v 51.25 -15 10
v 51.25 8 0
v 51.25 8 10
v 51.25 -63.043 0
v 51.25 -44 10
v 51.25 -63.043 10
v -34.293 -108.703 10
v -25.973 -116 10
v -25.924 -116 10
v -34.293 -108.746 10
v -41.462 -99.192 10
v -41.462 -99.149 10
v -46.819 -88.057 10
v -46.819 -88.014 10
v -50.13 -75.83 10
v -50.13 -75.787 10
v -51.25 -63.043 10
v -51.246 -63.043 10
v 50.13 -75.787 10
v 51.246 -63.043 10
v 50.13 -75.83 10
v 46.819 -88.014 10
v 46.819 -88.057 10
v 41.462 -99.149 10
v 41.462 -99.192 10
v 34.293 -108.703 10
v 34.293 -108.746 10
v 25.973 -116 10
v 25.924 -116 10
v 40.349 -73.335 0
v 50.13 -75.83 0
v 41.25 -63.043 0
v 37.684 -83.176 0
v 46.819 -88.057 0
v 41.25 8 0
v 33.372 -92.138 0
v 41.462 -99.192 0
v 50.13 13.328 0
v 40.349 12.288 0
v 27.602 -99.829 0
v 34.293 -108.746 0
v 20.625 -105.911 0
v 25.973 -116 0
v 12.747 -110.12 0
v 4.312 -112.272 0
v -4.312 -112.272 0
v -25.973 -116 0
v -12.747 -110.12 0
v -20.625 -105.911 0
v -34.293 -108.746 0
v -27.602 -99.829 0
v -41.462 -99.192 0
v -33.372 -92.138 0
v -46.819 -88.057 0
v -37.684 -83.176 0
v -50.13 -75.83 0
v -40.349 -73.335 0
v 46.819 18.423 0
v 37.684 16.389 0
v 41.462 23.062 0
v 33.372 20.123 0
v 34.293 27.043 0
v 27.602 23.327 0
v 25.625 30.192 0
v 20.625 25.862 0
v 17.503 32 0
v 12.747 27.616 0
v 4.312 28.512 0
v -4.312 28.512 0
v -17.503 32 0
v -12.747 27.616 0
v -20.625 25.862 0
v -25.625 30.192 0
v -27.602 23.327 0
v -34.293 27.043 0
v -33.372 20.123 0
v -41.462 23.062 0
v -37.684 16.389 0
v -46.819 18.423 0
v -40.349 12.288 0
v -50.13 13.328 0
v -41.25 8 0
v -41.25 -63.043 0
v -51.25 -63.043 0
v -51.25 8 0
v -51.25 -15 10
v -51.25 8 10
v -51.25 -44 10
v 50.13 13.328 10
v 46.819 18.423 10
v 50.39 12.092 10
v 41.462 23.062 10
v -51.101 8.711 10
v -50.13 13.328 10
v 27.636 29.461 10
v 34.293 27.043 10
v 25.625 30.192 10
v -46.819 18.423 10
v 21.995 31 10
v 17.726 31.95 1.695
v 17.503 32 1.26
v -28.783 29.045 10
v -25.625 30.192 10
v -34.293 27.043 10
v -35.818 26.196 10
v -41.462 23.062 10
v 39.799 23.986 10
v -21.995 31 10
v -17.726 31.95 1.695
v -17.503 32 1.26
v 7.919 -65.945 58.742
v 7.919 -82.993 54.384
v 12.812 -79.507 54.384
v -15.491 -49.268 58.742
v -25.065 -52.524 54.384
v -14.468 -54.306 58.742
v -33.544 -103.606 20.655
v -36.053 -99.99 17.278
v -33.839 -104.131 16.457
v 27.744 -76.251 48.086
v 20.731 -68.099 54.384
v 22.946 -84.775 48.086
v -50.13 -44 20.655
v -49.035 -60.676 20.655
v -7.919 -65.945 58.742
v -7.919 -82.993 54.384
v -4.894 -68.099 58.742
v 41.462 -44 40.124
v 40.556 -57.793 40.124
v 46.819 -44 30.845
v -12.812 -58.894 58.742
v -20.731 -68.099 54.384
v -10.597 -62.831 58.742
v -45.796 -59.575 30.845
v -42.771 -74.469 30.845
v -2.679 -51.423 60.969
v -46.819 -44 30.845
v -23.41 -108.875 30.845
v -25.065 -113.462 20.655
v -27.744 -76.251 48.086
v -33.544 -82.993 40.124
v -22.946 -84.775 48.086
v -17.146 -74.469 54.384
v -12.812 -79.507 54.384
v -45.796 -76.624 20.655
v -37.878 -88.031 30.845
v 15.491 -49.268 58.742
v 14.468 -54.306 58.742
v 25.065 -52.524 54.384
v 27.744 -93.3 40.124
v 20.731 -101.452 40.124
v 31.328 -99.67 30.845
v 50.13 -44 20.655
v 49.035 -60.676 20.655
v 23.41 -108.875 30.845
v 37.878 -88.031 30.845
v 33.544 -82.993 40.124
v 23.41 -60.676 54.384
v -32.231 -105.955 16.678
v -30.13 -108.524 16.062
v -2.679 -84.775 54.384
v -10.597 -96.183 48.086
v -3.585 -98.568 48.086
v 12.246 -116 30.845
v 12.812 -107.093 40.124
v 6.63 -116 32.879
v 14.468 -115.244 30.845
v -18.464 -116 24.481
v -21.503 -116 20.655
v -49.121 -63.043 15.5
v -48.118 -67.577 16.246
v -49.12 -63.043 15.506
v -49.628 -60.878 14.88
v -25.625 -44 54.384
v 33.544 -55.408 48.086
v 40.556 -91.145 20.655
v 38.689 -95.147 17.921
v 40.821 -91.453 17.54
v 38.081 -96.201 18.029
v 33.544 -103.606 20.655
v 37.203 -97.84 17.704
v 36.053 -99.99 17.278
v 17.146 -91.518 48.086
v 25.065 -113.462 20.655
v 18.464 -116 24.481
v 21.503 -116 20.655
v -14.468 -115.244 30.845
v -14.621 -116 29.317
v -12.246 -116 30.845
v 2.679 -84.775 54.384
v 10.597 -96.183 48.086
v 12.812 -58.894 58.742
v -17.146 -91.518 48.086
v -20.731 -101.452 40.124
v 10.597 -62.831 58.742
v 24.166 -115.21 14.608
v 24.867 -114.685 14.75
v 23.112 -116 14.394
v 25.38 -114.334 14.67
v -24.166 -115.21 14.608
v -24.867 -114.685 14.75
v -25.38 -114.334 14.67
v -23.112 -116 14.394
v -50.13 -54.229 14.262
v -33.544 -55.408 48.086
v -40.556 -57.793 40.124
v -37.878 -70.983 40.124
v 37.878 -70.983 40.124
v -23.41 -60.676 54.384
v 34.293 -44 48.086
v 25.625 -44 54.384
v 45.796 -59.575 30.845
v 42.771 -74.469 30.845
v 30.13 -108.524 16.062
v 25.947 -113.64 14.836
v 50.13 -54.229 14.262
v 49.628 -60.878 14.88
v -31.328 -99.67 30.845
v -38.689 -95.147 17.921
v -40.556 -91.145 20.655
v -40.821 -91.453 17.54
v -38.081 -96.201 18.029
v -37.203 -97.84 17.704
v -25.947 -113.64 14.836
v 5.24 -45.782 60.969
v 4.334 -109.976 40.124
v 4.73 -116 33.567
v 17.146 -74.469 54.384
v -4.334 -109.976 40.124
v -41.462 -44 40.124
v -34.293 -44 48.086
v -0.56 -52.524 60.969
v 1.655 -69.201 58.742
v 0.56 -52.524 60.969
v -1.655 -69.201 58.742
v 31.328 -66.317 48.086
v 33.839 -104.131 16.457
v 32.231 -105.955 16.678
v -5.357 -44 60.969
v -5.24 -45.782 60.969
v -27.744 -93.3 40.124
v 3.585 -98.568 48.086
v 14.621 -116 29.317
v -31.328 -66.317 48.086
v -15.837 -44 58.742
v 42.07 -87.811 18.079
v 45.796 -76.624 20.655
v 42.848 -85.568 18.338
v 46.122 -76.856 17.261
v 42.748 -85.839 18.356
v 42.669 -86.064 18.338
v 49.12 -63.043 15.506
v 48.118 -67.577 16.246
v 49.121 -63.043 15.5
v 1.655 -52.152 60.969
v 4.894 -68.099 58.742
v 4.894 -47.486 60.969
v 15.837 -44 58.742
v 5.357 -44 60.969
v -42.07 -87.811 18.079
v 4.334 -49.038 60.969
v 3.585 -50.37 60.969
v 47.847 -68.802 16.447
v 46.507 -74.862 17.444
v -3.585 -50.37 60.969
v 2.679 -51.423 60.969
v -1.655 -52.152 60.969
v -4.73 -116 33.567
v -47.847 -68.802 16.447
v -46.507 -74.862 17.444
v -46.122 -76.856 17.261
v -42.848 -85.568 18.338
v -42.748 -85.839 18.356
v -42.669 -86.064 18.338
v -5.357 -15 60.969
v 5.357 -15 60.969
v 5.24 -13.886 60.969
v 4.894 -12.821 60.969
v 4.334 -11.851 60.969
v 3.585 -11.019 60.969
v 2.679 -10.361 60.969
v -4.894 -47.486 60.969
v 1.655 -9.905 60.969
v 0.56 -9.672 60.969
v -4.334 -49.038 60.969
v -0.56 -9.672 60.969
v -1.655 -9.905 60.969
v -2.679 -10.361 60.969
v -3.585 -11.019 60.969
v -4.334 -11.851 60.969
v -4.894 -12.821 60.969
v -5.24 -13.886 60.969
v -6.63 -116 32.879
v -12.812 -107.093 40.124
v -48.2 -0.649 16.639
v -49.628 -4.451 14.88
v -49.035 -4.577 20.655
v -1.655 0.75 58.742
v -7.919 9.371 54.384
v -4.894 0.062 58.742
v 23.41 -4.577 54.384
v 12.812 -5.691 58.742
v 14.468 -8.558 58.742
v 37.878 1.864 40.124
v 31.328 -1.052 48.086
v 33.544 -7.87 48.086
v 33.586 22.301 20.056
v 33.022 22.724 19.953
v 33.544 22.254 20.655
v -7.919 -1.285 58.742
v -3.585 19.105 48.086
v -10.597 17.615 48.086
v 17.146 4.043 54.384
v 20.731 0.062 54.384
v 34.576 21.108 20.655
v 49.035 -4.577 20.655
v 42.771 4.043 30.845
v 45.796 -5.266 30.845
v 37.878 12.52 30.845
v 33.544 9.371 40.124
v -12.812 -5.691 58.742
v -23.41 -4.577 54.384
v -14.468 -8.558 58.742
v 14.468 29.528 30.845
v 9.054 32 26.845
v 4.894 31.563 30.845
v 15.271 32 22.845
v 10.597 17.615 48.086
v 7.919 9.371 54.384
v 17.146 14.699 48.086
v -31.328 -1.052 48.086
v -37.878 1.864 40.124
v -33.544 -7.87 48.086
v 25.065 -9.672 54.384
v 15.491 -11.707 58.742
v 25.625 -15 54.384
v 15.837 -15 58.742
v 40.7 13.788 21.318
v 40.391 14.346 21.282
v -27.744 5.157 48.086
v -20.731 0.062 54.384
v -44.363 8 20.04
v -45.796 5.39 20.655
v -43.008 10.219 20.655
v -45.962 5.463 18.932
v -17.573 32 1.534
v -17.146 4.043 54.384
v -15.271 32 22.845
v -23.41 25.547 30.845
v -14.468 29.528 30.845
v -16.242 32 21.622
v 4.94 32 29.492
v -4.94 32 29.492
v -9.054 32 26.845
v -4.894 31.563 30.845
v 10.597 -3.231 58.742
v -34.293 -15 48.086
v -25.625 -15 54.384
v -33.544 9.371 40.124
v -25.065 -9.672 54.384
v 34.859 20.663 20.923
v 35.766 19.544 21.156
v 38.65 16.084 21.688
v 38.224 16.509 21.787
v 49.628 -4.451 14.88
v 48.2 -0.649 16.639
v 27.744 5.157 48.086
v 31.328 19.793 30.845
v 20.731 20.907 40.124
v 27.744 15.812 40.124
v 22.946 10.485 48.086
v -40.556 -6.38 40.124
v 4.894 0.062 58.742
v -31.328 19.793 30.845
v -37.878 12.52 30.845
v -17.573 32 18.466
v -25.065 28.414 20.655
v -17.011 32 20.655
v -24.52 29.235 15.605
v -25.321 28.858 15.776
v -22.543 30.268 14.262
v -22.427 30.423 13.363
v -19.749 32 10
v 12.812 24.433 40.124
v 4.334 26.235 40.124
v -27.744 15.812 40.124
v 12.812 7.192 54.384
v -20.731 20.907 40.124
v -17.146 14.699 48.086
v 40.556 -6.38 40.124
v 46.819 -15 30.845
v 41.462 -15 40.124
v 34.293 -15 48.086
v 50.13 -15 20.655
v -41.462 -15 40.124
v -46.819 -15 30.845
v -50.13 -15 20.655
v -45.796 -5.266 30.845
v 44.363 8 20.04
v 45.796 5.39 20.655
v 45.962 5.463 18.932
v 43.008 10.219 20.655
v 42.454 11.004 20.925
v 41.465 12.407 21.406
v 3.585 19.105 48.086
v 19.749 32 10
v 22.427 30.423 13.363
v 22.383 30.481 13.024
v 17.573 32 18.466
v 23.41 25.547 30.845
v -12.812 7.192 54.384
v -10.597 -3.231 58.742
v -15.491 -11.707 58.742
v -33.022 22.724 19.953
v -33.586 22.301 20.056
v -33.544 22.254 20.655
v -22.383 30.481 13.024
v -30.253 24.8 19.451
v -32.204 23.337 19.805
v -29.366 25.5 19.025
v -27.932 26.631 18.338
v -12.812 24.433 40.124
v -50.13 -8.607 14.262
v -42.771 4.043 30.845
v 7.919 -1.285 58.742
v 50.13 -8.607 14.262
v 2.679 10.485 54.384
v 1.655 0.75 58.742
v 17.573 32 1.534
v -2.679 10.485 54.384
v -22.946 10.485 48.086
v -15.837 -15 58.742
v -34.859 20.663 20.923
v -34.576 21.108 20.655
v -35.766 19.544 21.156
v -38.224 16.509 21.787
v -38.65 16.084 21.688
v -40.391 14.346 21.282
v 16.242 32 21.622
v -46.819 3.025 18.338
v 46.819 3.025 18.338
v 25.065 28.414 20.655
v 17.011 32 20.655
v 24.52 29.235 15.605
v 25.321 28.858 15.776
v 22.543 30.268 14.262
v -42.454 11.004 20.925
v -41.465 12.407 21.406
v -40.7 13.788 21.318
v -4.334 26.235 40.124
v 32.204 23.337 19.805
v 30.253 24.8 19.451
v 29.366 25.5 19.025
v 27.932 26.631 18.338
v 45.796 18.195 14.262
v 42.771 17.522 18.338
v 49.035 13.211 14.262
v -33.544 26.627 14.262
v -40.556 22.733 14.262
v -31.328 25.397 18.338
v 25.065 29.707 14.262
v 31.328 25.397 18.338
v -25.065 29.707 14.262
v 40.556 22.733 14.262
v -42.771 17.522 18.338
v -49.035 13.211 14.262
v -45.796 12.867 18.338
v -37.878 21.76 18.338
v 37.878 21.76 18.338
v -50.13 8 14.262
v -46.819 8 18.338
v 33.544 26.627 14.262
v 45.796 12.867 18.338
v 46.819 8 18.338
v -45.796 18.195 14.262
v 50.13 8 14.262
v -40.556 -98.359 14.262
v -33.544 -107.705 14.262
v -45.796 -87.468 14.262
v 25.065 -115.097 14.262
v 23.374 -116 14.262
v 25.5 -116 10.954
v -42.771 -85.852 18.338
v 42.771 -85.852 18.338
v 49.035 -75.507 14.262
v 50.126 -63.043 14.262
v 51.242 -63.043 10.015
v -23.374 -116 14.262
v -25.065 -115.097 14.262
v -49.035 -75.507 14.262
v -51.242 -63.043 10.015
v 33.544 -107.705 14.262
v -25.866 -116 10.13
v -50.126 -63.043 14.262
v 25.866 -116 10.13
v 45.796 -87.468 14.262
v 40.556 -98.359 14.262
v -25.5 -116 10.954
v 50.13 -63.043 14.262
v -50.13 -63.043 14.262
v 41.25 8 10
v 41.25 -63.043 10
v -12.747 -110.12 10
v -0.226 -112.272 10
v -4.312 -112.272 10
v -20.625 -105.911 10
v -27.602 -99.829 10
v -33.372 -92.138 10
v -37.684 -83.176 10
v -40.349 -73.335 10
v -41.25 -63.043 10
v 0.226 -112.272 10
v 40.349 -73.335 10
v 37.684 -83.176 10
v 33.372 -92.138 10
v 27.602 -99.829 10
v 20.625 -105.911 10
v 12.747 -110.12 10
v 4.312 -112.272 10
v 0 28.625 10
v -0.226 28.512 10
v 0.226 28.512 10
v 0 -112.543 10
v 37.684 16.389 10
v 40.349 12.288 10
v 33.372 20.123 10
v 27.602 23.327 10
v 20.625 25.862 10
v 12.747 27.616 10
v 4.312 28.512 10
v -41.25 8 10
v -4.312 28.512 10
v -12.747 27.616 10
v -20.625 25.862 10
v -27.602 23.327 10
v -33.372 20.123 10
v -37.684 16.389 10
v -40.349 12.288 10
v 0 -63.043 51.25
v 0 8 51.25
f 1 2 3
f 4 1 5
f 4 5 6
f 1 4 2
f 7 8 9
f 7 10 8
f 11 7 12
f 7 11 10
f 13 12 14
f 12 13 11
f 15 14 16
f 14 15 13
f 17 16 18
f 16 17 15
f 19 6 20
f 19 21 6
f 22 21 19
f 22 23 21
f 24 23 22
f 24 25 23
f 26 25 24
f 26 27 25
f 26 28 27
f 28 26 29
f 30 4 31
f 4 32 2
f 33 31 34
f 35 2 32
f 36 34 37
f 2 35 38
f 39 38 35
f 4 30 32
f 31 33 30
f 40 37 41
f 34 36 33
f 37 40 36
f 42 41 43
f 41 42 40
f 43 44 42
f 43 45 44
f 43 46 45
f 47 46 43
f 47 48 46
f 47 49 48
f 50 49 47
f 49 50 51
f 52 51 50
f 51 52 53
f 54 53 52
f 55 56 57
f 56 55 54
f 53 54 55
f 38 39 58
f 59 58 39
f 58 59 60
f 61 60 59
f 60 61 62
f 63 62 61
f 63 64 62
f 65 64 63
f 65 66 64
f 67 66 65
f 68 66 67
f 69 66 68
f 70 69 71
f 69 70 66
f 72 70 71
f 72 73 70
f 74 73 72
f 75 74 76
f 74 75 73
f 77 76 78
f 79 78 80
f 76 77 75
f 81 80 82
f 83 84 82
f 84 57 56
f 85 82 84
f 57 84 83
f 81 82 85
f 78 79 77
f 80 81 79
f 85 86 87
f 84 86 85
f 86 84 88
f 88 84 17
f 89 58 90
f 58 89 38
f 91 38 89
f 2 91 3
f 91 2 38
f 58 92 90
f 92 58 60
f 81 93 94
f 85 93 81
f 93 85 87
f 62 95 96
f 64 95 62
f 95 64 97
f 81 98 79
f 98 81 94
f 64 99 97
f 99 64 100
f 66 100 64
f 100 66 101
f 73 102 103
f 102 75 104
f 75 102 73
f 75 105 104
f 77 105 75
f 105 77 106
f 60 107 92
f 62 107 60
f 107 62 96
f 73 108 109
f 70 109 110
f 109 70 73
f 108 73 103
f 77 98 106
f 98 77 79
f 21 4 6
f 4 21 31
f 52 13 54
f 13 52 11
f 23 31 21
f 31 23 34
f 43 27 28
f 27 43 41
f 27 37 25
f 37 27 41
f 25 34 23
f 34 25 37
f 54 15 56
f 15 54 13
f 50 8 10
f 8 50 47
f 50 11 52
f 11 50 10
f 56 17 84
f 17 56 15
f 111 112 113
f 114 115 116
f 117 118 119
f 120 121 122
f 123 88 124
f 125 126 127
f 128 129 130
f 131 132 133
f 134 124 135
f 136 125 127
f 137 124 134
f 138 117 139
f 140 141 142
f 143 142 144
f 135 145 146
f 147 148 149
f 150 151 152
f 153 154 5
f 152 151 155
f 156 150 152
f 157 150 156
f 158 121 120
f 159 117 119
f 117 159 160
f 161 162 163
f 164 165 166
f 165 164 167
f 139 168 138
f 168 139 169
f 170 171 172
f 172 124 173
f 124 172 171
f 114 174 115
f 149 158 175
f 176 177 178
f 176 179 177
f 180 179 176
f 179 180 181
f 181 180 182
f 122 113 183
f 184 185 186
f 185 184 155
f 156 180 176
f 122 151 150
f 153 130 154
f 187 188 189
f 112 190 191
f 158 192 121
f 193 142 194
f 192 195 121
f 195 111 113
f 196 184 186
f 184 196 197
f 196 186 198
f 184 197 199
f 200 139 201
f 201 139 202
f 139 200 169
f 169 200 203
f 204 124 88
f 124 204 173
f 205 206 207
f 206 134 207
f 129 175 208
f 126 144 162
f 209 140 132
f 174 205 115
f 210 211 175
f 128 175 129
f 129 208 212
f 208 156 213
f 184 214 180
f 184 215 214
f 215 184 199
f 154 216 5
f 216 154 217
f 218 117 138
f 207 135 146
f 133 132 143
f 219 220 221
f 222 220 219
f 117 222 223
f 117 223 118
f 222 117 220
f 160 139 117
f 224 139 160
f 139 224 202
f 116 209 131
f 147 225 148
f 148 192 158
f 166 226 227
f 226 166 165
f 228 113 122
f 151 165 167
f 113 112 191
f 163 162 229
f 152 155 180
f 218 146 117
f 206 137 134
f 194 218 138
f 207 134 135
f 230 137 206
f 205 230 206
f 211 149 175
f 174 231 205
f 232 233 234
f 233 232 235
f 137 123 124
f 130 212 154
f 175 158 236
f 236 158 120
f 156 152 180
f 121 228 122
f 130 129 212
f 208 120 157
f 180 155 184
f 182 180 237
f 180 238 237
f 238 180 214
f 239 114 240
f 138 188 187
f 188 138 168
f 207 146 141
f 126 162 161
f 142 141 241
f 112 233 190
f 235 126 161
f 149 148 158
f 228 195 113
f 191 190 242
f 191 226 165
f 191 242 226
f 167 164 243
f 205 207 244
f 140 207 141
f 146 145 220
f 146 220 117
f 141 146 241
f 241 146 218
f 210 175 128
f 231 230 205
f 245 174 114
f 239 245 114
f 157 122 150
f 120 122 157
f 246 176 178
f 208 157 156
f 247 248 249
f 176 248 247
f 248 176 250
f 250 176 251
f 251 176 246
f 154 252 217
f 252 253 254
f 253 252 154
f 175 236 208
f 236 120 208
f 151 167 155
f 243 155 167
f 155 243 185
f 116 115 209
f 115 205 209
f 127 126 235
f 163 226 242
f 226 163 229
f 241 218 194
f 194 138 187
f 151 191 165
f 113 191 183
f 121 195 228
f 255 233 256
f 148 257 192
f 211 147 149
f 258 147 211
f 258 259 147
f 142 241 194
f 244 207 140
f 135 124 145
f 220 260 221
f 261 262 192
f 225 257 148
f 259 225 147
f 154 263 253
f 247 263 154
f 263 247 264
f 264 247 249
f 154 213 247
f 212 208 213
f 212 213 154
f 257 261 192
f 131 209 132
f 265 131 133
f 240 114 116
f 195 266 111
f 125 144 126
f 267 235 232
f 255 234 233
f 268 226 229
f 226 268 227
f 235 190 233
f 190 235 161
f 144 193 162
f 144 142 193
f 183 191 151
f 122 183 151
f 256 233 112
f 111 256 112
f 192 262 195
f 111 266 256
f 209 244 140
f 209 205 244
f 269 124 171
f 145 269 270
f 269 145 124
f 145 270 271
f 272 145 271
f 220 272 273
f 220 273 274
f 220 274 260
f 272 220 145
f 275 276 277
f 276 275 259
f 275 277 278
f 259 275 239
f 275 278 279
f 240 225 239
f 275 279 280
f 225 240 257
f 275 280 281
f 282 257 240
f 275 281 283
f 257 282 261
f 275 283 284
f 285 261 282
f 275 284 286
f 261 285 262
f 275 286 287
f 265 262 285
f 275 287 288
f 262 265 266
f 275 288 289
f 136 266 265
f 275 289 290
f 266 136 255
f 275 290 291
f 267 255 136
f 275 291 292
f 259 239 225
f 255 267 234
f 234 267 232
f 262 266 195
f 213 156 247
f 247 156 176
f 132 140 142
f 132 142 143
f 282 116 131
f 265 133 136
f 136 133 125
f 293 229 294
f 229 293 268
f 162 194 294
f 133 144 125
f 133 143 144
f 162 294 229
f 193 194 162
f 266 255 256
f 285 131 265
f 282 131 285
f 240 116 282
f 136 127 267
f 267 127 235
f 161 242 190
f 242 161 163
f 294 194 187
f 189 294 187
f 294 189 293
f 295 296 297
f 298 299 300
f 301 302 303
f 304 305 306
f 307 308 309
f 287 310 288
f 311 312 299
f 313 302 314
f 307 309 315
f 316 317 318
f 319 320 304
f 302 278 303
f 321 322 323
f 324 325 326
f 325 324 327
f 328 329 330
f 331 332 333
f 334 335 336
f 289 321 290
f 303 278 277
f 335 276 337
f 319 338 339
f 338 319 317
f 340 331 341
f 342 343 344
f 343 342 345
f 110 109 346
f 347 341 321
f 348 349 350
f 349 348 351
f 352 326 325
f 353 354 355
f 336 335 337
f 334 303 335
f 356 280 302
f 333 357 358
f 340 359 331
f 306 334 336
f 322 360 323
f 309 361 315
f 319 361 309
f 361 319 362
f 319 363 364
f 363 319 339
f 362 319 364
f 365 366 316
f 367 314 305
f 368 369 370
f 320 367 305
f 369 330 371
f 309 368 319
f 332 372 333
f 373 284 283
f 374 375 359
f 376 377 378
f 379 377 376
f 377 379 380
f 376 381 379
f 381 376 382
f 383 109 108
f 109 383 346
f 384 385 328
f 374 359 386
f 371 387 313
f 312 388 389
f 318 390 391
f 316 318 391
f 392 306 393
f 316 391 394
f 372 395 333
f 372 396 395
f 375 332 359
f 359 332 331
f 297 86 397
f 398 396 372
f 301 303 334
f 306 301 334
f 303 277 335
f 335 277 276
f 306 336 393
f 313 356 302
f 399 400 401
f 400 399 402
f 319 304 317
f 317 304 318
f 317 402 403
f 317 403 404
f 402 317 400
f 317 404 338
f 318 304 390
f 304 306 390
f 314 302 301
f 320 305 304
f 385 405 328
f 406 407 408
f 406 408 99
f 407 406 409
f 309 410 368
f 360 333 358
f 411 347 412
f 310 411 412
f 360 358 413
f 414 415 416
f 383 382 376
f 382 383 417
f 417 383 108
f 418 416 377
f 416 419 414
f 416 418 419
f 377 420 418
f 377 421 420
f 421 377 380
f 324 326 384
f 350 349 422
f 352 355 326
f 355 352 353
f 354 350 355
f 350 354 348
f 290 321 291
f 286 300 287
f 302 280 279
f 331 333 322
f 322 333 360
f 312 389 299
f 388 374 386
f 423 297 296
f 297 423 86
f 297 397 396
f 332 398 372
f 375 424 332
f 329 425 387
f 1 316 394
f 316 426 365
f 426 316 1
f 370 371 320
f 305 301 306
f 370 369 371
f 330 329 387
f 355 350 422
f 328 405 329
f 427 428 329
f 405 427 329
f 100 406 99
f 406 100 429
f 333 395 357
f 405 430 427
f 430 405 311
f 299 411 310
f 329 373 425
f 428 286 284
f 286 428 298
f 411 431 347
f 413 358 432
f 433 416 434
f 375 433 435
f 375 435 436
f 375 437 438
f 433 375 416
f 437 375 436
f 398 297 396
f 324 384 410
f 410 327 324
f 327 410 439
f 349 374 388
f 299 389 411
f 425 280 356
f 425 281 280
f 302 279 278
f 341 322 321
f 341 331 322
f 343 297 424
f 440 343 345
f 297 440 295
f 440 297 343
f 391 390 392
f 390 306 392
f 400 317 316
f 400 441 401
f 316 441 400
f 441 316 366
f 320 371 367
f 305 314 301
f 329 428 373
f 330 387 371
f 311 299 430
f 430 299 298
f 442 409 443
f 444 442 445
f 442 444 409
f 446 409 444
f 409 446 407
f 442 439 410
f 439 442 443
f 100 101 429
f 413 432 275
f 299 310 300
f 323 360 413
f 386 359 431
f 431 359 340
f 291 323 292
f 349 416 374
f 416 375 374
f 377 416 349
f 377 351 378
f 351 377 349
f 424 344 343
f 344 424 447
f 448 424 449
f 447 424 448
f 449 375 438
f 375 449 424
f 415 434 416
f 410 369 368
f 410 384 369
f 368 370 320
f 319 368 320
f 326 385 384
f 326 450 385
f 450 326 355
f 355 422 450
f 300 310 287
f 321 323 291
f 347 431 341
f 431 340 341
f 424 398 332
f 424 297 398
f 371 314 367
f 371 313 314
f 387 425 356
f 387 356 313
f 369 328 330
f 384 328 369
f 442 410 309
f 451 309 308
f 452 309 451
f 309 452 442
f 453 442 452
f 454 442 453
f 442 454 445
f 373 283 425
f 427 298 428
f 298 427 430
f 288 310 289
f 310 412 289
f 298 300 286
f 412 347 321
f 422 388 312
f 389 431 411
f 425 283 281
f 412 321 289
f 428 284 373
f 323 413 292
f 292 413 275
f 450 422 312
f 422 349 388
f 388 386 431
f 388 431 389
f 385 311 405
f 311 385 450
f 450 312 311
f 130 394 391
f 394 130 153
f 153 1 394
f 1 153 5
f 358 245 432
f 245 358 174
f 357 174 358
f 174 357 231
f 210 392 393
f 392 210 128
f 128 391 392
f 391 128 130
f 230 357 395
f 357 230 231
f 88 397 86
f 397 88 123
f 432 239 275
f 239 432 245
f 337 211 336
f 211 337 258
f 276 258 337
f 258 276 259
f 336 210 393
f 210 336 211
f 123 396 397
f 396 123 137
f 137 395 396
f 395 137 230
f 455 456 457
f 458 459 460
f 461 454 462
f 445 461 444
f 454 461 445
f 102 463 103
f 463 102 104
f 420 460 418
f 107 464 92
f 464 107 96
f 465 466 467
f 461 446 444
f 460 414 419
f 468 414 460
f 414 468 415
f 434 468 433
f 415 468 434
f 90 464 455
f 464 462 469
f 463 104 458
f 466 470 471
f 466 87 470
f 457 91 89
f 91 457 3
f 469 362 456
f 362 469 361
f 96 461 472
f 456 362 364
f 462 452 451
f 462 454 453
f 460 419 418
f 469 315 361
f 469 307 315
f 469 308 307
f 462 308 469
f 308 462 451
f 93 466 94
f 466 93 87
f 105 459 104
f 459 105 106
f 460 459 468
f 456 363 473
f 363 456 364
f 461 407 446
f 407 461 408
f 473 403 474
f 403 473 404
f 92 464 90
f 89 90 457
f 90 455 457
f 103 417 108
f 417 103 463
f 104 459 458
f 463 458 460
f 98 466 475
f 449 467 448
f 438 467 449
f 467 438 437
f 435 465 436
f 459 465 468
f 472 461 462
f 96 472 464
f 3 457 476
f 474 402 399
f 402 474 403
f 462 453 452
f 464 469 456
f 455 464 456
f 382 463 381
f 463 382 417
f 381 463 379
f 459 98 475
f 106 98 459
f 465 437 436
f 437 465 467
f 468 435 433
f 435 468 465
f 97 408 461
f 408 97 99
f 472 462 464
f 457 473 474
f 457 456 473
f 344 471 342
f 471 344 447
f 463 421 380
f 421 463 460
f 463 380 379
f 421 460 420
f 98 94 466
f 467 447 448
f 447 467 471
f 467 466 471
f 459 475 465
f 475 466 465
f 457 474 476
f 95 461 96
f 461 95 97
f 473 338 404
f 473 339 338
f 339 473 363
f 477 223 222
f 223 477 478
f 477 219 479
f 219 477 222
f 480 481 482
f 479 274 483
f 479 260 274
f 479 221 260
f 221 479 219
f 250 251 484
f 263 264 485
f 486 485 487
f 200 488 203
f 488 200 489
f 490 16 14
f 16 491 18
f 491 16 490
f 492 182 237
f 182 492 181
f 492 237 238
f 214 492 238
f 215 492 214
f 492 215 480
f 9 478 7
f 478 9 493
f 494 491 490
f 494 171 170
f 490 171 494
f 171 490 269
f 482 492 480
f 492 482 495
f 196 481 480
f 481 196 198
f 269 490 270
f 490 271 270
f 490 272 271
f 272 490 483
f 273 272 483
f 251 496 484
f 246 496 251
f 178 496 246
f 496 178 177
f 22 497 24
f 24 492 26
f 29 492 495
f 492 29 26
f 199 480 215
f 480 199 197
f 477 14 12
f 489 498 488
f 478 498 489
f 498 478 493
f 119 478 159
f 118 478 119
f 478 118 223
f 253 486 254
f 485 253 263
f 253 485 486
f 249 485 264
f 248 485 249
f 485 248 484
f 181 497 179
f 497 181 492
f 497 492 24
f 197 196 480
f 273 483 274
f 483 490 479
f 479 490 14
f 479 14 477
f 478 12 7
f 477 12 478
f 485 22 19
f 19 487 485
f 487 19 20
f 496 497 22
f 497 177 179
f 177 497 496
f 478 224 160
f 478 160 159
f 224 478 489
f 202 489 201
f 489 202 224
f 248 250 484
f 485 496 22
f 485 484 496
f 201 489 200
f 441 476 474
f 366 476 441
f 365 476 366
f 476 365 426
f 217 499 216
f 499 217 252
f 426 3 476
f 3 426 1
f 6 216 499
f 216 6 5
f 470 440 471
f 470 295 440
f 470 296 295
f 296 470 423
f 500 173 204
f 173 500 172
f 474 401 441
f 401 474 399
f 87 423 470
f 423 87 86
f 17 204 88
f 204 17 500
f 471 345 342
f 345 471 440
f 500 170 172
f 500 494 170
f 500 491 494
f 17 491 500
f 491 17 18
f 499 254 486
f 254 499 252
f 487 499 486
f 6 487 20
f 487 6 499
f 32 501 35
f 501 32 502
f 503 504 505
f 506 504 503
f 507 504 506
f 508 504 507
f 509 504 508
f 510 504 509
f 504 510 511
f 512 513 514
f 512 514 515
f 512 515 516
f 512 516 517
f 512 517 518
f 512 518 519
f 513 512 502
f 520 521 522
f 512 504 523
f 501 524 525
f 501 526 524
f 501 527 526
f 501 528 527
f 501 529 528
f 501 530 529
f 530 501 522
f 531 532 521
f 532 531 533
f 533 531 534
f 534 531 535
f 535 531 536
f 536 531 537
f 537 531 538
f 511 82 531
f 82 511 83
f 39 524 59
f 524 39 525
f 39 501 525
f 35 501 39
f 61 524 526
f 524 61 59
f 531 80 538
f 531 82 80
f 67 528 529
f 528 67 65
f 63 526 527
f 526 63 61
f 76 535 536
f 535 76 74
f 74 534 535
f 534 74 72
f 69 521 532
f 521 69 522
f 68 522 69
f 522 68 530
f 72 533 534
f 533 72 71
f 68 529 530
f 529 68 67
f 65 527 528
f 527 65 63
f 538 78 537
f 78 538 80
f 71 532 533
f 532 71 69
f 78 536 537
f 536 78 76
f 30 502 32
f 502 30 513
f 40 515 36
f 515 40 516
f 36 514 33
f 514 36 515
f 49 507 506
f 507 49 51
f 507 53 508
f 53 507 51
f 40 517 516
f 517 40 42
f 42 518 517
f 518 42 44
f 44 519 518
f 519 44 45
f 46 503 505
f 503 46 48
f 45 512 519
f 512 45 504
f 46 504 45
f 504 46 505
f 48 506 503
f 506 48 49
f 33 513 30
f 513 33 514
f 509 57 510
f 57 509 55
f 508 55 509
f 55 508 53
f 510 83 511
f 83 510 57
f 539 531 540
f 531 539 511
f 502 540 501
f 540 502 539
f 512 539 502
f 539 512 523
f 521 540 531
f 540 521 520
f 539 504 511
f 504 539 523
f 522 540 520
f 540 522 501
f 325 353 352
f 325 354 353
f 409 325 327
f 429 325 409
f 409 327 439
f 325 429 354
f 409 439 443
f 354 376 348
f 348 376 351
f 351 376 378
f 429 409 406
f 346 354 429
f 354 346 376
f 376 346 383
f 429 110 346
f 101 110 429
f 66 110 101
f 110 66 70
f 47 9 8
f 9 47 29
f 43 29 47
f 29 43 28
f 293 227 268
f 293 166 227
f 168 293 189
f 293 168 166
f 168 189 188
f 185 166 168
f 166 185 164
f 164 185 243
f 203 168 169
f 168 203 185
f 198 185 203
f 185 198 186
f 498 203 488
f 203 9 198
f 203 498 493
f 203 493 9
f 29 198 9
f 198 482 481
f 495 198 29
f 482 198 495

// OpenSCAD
// file: CoreBasePlate.scad
module CoreBasePlate(basewidth = 92.5, centralBoxLength=71.043, baseThickness=10, headScaleFactor=0.5, tailScaleFactor=1.2, shaftOffset=8)
{
	translate([-basewidth/2, -centralBoxLength+shaftOffset,0])
	{
		// Create Central Cube
		cube([basewidth, centralBoxLength, baseThickness]);

		// Create Head Cylinder
		translate([basewidth/2,centralBoxLength,0])
			scale([1,headScaleFactor,1])
				cylinder(baseThickness, d=basewidth);

		// Create Tail Cylinder
		translate([basewidth/2,0,0])
			scale([1,tailScaleFactor,1])
				cylinder(baseThickness, d=basewidth);
	}
}

//CoreBasePlate();
// file: RobotShell.scad
/**
 * Module Name: Robot Shell
 * 
 * Description:
 *     Robot Shell
 *
 */
include <CoreBasePlate.scad>;

module RobotShell(basewidth=92.5)
{
	GOLDEN_RATIO = 1.618;
	centralBoxLength=71.043;
	baseThickness=10;
	headScaleFactor=0.5;
	tailScaleFactor=1.2;
	heightScaleFactor = .4; //1/GOLDEN_RATION
	shellWidth = basewidth + 10;

	topShellScaleFactor = 1;

	difference()
	{
	union()
	{
		// Top-Back Roundess
		translate([0,-44,baseThickness])
			scale([1, 1.6,topShellScaleFactor])
				sphere(d=shellWidth);

		// Top-Front Roundess
		translate([0,-15,baseThickness])
			scale([1, 1,topShellScaleFactor])
				sphere(d=shellWidth);

		// Connection of front to back
		translate([0,-15, baseThickness])
			scale([1, 1,topShellScaleFactor])
				rotate([90,0,0])
					cylinder(d=shellWidth, 44-15);

		// Head Roundess
		translate([0,8,baseThickness])
			scale([1, headScaleFactor,heightScaleFactor])
				sphere(d=shellWidth);

		// Tail Roundness
		translate([0,-63,baseThickness])
			scale([1, tailScaleFactor,heightScaleFactor])
				sphere(d=shellWidth);

		// Connection of front to back
		translate([0,8, baseThickness])
			scale([1, 1,heightScaleFactor])
				rotate([90,0,0])
					cylinder(d=shellWidth, centralBoxLength);
	
		// Connection to base
		CoreBasePlate(basewidth=shellWidth, centralBoxLength=centralBoxLength, 
					  baseThickness=baseThickness, headScaleFactor=headScaleFactor, 
					  tailScaleFactor=tailScaleFactor);
	}
		translate([-100,-150,-200])
			cube([200,200,200]);
	
		translate([0,0,0])
			InnerCavity(basewidth=shellWidth-20, centralBoxLength=centralBoxLength);
	}
}
//RobotShell();

module InnerCavity(basewidth=100,maxHeight=50,centralBoxLength=100, 
						 baseThickness=10,
						 headScaleFactor=0.5, tailScaleFactor=1.2, shaftOffset=8)
{
	headLength = basewidth/2 * headScaleFactor;
	tailLength = basewidth/2 * tailScaleFactor;
	h=basewidth/2;
	p0 = [basewidth,centralBoxLength,0];
	p1 = [basewidth,0,0];
	p2 = [0,0,0];
	p3 = [0,centralBoxLength,0];

	t4 = [basewidth/2,0,h];
	t5 = [basewidth/2,centralBoxLength,h];

	p6 = [basewidth/2, centralBoxLength+headLength,0];
	p7 = [basewidth/2, -tailLength,0];

	CoreBasePlate(basewidth=basewidth, centralBoxLength=centralBoxLength, 
					  baseThickness=baseThickness, headScaleFactor=headScaleFactor, 
					  tailScaleFactor=tailScaleFactor, shaftOffset=shaftOffset);

	translate([-basewidth/2,-centralBoxLength+shaftOffset,baseThickness])
		polyhedron
		(
			points=[p0,p1,p2,p3, // the four points at base
         	 	  t4,t5,       // Apexes
       			  p6, p7],     // head and tail 
		   faces =[[0,1,4],[2,3,4],[3,5,4],[5,0,4],   // base sides
	     			  [0,5,6],[3,6,5],[0,6,3],           // head
					  [1,7,4],[2,4,7],[1,2,7],           // tail
		           [1,0,3],[2,1,3] ]                  // base bottom
		);
}
//InnerCavity();
// main file
include<RobotShell.scad>;
module ShellForPrintrBot()
{
	headSpot = 32;
	difference()
	{
		RobotShell();
		translate([-75,headSpot,0])
				cube([150,50,100], $fn=10);
		translate([-75,-148+headSpot,0])
			mirror([0,1,0])
				cube([150,150,100], $fn=10);
	}
}
ShellForPrintrBot();
